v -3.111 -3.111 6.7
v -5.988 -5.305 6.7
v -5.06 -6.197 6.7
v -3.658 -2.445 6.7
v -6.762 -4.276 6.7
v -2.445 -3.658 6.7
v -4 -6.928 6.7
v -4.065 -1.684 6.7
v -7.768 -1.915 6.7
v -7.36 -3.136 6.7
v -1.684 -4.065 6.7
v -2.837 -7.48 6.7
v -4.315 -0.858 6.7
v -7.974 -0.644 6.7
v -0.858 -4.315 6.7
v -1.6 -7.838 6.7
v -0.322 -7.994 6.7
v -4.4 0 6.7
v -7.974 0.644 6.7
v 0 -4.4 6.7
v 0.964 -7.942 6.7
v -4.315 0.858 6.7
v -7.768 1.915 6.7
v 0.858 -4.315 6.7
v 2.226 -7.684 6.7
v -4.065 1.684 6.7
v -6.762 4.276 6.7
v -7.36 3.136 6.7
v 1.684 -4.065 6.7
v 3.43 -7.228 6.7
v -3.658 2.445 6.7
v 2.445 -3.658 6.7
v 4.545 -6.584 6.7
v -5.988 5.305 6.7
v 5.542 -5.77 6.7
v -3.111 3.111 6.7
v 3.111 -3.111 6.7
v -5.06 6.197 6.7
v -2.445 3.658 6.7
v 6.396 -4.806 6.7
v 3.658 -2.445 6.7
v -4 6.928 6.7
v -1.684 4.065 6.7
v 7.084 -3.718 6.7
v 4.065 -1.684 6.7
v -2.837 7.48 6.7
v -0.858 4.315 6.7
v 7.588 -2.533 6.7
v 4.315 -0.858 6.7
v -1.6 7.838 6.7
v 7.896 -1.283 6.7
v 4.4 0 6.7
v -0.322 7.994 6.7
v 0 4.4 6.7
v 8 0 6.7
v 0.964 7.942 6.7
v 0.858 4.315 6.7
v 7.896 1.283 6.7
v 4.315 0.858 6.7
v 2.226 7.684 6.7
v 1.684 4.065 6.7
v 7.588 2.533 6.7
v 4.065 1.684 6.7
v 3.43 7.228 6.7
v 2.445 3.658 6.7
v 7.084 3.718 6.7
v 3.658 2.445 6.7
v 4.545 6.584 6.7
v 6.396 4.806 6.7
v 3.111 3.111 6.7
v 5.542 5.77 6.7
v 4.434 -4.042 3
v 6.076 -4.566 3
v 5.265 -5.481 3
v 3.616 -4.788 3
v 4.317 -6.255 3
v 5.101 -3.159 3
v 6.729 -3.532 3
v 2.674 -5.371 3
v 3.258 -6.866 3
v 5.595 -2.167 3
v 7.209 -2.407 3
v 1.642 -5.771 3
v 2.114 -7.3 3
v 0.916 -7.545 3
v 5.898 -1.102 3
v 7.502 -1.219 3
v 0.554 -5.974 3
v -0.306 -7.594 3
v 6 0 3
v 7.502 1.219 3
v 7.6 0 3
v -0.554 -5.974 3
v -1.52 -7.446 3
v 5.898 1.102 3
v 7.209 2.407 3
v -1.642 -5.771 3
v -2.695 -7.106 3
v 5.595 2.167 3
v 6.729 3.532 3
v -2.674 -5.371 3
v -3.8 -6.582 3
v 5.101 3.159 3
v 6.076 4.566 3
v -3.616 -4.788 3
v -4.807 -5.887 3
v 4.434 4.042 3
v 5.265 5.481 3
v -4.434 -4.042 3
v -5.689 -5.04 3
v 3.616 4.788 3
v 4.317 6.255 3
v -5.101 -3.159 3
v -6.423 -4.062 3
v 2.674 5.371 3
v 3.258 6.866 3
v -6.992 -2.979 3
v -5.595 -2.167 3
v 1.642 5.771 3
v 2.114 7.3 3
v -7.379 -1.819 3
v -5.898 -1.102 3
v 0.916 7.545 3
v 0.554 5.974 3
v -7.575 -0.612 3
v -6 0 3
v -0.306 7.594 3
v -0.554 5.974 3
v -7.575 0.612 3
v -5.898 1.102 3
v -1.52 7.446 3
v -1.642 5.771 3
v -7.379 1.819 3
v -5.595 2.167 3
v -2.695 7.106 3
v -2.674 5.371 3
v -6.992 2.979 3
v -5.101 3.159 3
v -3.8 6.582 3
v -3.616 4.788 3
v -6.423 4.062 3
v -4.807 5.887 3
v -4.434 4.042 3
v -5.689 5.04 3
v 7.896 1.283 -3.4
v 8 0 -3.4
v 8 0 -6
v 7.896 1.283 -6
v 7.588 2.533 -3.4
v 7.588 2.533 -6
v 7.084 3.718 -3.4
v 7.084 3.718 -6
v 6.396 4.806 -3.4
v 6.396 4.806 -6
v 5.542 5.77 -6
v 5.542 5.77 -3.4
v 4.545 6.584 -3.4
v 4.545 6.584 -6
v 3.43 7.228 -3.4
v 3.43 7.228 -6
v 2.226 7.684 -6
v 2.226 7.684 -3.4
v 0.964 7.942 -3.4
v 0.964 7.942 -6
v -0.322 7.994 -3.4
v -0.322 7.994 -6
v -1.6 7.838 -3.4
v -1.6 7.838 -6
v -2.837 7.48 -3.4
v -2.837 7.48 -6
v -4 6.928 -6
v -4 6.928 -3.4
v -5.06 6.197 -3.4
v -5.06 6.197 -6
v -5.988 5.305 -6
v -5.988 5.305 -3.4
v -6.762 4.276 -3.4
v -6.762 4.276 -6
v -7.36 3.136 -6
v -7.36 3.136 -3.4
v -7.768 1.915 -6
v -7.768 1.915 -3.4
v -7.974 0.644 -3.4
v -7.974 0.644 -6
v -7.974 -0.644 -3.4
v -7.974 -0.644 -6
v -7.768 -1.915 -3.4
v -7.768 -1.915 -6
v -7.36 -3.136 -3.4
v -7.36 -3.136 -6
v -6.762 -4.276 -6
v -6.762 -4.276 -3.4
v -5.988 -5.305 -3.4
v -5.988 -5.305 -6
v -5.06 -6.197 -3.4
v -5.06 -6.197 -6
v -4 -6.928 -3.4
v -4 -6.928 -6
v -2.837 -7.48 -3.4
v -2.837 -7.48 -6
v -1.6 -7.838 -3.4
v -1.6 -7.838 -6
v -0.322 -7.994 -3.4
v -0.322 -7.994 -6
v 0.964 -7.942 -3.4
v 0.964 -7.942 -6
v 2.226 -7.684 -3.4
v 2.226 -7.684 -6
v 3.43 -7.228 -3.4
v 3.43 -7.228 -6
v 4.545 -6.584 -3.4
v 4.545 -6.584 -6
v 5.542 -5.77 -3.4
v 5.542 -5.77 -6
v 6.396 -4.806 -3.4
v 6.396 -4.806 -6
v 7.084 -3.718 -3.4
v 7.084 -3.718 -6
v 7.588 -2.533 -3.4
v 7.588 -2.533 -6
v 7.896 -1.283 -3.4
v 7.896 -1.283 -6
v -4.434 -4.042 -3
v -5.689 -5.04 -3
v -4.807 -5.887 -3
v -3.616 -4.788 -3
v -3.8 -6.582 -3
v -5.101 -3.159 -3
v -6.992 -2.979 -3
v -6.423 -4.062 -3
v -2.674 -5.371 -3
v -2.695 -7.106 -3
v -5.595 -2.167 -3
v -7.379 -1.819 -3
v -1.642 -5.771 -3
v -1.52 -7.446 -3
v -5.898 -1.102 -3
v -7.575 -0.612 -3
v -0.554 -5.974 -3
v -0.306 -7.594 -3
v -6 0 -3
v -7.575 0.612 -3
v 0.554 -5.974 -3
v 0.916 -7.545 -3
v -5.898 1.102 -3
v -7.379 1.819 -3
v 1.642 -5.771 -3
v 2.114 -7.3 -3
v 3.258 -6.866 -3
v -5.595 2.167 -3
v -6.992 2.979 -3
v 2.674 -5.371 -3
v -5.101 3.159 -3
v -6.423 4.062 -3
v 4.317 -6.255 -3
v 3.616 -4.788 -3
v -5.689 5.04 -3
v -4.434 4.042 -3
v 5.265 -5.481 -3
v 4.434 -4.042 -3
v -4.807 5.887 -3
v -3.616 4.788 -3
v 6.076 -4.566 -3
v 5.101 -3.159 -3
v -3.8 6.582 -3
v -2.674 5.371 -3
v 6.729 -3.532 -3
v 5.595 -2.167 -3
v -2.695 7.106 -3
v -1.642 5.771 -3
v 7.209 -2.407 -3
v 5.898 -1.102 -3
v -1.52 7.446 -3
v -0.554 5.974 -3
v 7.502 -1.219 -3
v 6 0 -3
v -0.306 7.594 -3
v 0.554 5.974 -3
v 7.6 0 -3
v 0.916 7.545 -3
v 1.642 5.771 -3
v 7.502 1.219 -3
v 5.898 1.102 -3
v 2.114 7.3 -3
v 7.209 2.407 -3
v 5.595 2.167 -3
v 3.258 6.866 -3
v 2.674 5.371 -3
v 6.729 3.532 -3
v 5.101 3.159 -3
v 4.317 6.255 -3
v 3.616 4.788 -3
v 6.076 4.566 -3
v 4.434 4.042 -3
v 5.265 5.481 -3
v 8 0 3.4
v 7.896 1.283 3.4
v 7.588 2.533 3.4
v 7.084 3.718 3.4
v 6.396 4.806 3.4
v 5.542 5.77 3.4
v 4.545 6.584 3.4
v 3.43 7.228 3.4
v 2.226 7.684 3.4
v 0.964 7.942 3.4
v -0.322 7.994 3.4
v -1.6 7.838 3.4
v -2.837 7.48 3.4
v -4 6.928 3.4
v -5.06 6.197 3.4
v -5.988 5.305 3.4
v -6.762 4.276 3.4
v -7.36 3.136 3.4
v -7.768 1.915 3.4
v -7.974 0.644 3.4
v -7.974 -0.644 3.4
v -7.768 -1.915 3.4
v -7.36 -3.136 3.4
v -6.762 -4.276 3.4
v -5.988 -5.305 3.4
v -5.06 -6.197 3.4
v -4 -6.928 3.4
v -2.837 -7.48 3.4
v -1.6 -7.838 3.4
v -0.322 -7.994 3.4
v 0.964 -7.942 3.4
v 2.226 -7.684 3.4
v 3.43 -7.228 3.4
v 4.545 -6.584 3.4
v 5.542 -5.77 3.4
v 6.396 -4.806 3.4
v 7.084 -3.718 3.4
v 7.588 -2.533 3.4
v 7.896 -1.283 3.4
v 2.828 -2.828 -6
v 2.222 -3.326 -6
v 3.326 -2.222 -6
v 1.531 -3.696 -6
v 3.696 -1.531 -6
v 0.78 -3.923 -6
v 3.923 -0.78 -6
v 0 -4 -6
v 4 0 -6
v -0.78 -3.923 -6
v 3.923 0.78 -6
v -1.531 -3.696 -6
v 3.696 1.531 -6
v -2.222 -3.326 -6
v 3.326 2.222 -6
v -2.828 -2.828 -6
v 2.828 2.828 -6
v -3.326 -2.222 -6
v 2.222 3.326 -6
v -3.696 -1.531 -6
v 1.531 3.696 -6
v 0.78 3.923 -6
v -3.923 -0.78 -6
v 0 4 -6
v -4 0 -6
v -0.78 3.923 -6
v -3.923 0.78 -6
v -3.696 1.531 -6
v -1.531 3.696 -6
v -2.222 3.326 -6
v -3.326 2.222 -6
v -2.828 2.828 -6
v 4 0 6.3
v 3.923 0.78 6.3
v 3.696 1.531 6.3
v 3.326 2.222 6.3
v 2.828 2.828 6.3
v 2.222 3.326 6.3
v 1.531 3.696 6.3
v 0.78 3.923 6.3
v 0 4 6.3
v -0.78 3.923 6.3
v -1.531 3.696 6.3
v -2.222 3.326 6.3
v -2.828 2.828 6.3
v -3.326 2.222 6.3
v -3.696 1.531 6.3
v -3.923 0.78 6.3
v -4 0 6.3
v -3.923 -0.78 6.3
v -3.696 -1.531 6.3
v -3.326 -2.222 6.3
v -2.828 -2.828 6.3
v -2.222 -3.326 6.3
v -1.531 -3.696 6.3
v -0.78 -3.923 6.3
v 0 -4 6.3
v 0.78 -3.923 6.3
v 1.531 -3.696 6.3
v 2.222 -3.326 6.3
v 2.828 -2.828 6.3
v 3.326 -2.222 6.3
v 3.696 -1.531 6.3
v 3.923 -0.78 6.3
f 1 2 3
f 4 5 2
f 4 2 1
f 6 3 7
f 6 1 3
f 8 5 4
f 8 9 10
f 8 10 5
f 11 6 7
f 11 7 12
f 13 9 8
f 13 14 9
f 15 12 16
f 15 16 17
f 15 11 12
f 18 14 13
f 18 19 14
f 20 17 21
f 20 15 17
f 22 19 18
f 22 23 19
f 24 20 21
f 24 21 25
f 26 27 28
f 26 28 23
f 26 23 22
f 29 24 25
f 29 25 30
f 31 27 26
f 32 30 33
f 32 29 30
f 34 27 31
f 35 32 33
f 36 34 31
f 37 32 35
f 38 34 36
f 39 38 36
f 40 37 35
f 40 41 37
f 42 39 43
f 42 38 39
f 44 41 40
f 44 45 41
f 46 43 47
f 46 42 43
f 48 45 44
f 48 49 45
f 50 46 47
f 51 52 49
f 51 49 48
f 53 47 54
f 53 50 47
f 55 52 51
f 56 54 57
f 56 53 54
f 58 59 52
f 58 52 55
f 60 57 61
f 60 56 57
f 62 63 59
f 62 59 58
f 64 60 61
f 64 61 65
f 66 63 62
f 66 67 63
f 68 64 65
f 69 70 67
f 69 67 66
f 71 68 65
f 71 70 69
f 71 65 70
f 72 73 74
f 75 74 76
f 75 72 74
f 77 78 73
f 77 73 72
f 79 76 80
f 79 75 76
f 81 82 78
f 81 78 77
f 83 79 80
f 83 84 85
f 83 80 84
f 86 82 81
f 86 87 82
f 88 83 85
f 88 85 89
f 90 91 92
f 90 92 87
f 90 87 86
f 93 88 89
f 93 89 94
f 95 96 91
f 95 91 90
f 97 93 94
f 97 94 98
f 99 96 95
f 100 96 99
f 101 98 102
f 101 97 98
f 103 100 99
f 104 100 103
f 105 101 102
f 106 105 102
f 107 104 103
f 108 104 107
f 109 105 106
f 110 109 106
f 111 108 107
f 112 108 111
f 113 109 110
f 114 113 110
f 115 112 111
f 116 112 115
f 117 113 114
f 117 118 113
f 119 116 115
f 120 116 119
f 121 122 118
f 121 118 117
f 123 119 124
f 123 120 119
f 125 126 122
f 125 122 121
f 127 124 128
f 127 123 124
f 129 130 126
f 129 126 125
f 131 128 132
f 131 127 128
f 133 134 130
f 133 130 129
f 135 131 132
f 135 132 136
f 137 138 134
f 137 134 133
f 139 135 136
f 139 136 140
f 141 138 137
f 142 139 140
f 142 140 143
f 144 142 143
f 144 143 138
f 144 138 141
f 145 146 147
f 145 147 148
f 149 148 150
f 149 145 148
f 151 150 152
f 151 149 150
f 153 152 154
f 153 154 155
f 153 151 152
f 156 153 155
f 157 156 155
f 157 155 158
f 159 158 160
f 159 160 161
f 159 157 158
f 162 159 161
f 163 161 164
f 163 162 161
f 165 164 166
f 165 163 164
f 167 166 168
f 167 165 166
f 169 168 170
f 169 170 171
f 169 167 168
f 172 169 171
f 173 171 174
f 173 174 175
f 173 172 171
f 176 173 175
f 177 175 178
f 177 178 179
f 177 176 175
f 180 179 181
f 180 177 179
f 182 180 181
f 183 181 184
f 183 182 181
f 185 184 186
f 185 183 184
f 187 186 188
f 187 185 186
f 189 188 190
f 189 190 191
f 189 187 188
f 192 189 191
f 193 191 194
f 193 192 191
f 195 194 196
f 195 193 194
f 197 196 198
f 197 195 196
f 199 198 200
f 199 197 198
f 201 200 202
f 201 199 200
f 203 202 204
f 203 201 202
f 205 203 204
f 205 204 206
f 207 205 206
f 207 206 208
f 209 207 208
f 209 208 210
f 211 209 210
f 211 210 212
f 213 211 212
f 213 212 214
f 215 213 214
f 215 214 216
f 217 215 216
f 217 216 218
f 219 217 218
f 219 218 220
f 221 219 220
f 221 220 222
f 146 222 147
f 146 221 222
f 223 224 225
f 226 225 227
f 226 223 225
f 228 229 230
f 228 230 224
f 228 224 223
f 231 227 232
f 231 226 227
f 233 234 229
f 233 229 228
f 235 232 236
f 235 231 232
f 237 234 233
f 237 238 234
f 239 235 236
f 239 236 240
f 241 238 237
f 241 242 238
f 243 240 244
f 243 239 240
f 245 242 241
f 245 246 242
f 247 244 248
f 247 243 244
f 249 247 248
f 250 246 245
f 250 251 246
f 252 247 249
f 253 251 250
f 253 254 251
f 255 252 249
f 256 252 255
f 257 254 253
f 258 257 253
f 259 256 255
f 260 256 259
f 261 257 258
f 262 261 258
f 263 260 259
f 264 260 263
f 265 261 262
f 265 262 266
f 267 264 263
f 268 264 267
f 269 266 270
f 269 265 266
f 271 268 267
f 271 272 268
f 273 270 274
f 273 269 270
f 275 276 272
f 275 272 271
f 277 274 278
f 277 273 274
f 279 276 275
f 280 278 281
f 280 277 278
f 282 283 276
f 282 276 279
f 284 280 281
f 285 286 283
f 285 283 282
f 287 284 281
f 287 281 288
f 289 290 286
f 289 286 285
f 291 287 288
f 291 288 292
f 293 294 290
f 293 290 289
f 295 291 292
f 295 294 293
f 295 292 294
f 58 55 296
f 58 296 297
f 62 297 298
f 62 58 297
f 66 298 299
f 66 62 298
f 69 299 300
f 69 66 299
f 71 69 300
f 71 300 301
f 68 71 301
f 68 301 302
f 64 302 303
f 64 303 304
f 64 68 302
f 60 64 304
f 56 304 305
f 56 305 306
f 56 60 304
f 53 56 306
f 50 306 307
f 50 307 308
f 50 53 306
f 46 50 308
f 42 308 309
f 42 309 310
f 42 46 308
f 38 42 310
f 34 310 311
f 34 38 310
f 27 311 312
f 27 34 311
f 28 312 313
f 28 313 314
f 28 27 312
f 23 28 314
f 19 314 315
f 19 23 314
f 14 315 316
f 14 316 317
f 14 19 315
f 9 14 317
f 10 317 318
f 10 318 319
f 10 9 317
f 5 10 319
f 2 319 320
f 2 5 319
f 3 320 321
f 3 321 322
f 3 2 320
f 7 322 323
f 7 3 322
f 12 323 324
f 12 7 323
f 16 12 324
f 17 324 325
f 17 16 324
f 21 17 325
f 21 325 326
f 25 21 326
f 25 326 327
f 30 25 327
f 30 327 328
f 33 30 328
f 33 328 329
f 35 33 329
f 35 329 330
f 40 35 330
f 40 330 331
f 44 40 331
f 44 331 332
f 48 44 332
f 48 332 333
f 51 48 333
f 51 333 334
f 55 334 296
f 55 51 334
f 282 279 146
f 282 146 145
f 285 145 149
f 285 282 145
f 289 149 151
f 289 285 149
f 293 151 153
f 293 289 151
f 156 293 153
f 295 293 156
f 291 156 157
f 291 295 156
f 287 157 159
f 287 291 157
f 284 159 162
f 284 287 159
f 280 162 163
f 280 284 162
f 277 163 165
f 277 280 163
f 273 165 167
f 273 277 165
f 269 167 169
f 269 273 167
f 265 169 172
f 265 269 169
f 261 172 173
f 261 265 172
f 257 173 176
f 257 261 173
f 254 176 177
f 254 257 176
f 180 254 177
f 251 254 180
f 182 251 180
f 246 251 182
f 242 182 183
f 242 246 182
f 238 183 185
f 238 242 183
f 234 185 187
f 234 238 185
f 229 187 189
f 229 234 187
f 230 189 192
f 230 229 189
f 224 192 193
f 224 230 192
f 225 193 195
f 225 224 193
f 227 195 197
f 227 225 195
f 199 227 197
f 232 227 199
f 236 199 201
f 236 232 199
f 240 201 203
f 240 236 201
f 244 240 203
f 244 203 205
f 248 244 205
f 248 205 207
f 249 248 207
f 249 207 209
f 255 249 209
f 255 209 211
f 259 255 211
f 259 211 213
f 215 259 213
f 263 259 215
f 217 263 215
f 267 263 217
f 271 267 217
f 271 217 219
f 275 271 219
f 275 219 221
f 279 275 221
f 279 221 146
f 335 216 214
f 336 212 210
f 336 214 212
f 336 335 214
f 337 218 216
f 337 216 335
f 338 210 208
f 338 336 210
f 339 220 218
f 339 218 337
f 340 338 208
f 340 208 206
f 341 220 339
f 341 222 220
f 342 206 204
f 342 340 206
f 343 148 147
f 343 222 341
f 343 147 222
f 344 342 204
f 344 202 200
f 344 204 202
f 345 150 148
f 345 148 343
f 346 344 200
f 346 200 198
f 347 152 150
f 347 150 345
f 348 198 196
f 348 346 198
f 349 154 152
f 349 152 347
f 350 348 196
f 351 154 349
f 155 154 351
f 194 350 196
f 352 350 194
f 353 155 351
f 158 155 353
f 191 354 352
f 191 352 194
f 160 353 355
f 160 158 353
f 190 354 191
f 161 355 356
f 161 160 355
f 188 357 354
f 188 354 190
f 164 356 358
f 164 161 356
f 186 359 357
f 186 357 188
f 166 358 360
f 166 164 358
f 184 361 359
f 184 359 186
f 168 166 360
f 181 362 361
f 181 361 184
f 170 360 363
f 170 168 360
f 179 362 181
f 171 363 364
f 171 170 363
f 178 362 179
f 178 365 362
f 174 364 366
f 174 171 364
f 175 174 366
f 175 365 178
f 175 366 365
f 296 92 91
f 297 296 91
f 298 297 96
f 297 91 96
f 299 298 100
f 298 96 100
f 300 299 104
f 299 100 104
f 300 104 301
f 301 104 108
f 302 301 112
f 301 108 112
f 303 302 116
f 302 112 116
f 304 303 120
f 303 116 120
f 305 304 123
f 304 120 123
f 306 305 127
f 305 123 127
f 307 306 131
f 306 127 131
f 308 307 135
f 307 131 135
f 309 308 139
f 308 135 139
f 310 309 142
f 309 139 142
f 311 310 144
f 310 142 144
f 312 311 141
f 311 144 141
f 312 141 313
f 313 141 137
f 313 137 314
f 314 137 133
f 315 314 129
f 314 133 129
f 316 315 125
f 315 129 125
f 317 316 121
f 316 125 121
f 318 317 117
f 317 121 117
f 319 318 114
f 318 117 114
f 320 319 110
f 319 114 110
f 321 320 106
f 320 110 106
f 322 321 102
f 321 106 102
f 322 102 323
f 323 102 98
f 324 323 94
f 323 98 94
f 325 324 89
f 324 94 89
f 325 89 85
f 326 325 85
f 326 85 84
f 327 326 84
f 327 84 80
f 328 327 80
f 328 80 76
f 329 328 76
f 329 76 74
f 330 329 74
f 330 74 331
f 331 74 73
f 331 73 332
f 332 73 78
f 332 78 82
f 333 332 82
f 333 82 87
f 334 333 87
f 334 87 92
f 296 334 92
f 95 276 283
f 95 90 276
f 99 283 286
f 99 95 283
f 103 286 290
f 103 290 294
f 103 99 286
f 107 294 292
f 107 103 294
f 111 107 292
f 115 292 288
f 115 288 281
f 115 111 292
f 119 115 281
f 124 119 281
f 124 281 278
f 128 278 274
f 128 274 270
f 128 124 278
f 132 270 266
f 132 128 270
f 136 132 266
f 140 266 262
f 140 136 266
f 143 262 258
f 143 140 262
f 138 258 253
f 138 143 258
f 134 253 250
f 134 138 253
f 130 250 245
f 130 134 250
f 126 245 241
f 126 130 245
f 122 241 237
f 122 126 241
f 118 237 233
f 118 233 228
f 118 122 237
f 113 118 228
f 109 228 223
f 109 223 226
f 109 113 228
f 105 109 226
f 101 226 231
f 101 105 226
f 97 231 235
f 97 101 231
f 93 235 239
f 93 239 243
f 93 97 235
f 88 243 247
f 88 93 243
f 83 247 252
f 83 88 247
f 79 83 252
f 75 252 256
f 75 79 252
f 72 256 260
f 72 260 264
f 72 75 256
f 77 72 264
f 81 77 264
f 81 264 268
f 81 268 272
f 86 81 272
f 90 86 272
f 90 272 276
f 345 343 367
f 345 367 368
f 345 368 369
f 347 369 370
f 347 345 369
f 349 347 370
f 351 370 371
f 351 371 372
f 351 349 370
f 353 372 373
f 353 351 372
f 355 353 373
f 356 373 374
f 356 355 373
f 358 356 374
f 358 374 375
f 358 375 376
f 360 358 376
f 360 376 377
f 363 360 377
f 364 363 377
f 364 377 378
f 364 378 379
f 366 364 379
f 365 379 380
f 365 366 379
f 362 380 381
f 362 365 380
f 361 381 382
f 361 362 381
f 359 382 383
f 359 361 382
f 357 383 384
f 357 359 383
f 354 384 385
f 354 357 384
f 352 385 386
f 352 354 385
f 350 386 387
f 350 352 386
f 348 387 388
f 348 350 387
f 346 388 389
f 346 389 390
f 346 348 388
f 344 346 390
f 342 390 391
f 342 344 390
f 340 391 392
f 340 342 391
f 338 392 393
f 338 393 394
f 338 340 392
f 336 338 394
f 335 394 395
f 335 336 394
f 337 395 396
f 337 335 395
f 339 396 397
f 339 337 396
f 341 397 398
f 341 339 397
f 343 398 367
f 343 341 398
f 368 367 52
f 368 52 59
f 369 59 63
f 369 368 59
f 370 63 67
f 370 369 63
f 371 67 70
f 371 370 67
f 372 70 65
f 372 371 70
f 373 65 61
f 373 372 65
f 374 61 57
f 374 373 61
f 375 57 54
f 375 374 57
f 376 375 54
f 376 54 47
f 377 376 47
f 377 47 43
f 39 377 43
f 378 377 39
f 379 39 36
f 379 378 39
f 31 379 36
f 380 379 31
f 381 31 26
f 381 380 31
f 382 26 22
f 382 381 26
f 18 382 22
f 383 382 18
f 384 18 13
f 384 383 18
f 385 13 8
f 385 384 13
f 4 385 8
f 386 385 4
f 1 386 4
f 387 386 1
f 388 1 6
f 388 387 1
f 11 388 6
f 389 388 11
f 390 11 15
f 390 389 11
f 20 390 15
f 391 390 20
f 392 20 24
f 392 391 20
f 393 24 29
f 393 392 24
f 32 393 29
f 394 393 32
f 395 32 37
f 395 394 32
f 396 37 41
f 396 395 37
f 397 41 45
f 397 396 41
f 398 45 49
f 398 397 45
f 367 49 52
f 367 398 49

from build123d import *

# Parameters (mm, degrees)
F2_SIZE = 0.4


with BuildPart() as f1:
    # F0 (on Front) → F1 (revolve)
    with BuildSketch(Plane.XZ):
        Polygon((8, 3), (8, 6.7), (4, 6.7), (4, -6), (8, -6), (8, -3), (6, -3), (6, 3), align=None)
    revolve(axis=Axis((0, 0, 0), (0, 0, 1)))

    # F2
    f2_edges = [f1.edges().sort_by_distance(p)[0] for p in [
        (-8, 0, 3),
        (-8, 0, -3),
        (-4, 0, 6.7),
    ]]
    chamfer(f2_edges, length=F2_SIZE)


solid = f1.part
